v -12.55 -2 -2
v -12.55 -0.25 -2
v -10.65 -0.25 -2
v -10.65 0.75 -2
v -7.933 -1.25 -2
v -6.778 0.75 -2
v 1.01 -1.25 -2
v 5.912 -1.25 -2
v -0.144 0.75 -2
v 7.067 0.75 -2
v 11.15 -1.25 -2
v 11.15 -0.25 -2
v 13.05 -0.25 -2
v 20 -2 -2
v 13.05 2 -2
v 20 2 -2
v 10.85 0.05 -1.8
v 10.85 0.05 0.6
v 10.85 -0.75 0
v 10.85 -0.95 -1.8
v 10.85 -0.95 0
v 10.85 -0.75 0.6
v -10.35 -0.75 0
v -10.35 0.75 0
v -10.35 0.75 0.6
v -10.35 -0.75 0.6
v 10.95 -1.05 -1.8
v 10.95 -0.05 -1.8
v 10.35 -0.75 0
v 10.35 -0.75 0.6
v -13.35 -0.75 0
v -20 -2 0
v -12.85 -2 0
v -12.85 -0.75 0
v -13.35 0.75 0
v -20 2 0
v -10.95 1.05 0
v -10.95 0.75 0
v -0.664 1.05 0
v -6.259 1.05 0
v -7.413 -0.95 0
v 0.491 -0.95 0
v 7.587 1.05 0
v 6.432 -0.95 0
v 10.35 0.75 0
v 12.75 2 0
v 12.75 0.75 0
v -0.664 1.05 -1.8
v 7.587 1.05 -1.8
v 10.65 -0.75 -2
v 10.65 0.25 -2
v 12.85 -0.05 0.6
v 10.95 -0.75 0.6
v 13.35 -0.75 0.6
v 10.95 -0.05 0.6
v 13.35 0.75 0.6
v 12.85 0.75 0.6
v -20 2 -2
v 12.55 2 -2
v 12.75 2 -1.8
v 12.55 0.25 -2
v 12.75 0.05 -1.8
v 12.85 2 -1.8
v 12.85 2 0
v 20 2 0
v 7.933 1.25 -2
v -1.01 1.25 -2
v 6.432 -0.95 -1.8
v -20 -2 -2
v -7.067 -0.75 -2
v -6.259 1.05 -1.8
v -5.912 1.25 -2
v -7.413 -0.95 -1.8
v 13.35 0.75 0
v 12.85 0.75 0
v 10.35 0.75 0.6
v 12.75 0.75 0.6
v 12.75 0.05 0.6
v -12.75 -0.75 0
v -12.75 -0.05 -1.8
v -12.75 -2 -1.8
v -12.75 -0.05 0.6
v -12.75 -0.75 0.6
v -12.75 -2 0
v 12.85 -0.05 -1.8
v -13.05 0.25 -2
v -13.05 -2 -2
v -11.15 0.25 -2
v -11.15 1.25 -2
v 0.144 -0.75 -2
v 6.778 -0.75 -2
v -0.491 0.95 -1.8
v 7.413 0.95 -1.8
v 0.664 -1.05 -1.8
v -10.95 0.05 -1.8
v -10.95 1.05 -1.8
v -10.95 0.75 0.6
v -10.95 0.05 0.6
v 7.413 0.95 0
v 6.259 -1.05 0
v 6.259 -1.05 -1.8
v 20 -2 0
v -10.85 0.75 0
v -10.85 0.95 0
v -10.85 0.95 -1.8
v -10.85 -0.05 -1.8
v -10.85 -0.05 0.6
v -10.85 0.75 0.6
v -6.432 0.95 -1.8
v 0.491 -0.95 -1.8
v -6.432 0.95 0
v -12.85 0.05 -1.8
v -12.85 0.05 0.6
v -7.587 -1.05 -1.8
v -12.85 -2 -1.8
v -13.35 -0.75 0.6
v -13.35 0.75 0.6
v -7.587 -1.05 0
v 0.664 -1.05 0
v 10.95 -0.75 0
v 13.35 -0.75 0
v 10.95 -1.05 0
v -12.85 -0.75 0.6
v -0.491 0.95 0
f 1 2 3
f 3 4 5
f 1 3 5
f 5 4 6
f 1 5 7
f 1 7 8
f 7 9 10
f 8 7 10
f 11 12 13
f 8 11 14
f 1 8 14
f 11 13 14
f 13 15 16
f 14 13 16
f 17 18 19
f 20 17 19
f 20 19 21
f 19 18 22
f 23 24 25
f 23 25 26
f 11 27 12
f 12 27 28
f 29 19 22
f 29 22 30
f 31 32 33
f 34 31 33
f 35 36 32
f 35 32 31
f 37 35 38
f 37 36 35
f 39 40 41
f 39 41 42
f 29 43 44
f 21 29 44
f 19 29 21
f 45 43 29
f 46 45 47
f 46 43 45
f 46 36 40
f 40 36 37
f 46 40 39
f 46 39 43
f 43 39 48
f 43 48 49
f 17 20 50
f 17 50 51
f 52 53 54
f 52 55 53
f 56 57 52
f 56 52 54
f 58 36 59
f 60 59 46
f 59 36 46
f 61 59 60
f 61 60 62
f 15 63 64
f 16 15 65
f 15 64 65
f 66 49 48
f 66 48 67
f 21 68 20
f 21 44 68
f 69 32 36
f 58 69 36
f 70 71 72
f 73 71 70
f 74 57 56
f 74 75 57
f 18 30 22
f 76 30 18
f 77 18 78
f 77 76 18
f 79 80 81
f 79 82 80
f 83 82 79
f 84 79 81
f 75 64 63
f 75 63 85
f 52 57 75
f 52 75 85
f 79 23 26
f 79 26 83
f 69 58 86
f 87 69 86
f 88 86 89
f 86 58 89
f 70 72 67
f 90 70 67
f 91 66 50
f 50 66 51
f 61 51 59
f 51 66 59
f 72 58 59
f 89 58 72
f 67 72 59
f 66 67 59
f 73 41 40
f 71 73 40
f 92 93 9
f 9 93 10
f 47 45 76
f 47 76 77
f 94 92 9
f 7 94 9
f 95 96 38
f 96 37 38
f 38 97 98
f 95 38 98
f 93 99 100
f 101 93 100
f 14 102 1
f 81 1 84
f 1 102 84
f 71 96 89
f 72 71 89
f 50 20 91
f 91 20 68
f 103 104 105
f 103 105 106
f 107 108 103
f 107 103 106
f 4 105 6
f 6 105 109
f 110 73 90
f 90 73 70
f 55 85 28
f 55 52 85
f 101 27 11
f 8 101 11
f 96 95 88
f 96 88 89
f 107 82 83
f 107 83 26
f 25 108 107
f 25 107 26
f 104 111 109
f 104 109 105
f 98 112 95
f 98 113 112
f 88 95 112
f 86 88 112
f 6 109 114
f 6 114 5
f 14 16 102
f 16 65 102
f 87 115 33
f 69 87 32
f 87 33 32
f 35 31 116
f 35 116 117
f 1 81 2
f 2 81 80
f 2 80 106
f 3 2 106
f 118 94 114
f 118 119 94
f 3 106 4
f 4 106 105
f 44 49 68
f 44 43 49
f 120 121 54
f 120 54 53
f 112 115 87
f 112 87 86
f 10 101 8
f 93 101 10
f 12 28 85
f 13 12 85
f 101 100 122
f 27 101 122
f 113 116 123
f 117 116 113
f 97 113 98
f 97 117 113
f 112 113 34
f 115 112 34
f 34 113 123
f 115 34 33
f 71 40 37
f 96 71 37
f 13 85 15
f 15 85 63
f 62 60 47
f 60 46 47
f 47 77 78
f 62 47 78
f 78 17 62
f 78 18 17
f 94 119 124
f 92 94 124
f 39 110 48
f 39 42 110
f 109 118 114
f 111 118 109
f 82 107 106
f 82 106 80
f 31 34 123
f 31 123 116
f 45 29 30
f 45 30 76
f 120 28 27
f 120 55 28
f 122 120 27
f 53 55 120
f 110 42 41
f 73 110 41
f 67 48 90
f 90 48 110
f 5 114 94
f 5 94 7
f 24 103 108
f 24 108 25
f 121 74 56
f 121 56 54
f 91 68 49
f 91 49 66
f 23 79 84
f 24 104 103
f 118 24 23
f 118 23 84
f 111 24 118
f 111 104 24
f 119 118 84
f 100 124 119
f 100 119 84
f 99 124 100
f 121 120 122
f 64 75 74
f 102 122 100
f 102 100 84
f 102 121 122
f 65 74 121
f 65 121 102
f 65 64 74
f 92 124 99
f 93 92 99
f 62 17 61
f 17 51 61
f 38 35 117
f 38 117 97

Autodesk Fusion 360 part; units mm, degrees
sketch "Sketch1" plane through (0, 0, 0) normal (0, 0, 1) x (1, 0, 0)
  line L0 (20, -2) -> (-20, -2)
  line L1 (-20, -2) -> (-20, 2)
  line L2 (-20, 2) -> (20, 2)
  line L3 (20, 2) -> (20, -2)
  line L4 (20, -2) -> (-20, 2) construction
  line L5 (-20, -2) -> (20, 2) construction
  line L6 (0, 0) -> (0, -2) construction
  line L7 (0, 0) -> (0, 2) construction
  line L8 (-12.45, 2) -> (-12.45, -2) construction
  line L9 (-11.25, 2) -> (-11.25, -2) construction
  line L10 (-12.75, 2) -> (-12.75, -2)
  line L11 (-10.95, 2) -> (-10.95, -2)
  line L12 (-10.85, 2) -> (-10.85, -2)
  line L13 (-12.85, 2) -> (-12.85, -2)
  line L14 (-11.85, 2) -> (-11.85, -2) construction
  line L15 (-20, 0.05) -> (20, 0.05)
  line L16 (20, -0.05) -> (-20, -0.05)
  line L17 (-20, 0) -> (20, 0) construction
  line L18 (0.5774, -1) -> (-0.5774, 1) construction
  line L19 (0.5774, -1) -> (-7.5, -1) construction
  line L20 (-7.5, -1) -> (-6.3453, 1) construction
  line L21 (-6.3453, 1) -> (-10.95, 1) construction
  line L22 (-0.5774, 1) -> (7.5, 1) construction
  line L23 (7.5, 1) -> (6.3453, -1) construction
  line L24 (6.3453, -1) -> (10.95, -1) construction
  line L25 (-3.4613, -1) -> (-3.4613, 1.05) construction
  line L26 (3.4613, 1) -> (3.4613, -1.05) construction
  line L27 (-6.2587, 1.05) -> (-10.95, 1.05)
  line L28 (-7.4134, -0.95) -> (-6.2587, 1.05)
  line L29 (0.4907, -0.95) -> (-7.4134, -0.95)
  line L30 (0.4907, -0.95) -> (-0.664, 1.05)
  line L31 (-0.664, 1.05) -> (7.5866, 1.05)
  line L32 (7.5866, 1.05) -> (6.4319, -0.95)
  line L33 (6.4319, -0.95) -> (10.95, -0.95)
  line L34 (12.85, 2) -> (12.85, -2)
  line L35 (12.75, 2) -> (12.75, -2)
  line L36 (12.45, 2) -> (12.45, -2) construction
  line L37 (11.25, 2) -> (11.25, -2) construction
  line L38 (10.95, 2) -> (10.95, -2)
  line L39 (10.85, 2) -> (10.85, -2)
  line L40 (-6.4319, 0.95) -> (-10.95, 0.95)
  line L41 (-7.5866, -1.05) -> (-6.4319, 0.95)
  line L42 (0.664, -1.05) -> (-7.5866, -1.05)
  line L43 (0.664, -1.05) -> (-0.4907, 0.95)
  line L44 (-0.4907, 0.95) -> (7.4134, 0.95)
  line L45 (7.4134, 0.95) -> (6.2587, -1.05)
  line L46 (6.2587, -1.05) -> (10.95, -1.05)
  line L47 (11.85, 2) -> (11.85, -2) construction
  line L48 (-10.35, -0.75) -> (-13.35, -0.75)
  line L49 (-13.35, -0.75) -> (-13.35, 0.75)
  line L50 (-13.35, 0.75) -> (-10.35, 0.75)
  line L51 (-10.35, 0.75) -> (-10.35, -0.75)
  line L52 (-10.35, -0.75) -> (-13.35, 0.75) construction
  line L53 (-13.35, -0.75) -> (-10.35, 0.75) construction
  line L54 (13.35, -0.75) -> (10.35, -0.75)
  line L55 (10.35, -0.75) -> (10.35, 0.75)
  line L56 (10.35, 0.75) -> (13.35, 0.75)
  line L57 (13.35, 0.75) -> (13.35, -0.75)
  line L58 (13.35, -0.75) -> (10.35, 0.75) construction
  line L59 (10.35, -0.75) -> (13.35, 0.75) construction
  point P0 (-11.85, 0)
  point P1 (11.85, 0)
  dimension "d1" = 4
  dimension "d2" = 40
  dimension "d16" = 0.1
  dimension "d57" = 0.1
  dimension "d60" = 2
  dimension "d61" = 30
  dimension "d62" = 15
  dimension "d63" = 0.05
  dimension "d69" = 1.2
  dimension "d70" = 1.8
  dimension "d73" = 22.5
  dimension "d74" = -0.05
  dimension "d113" = 3
  dimension "d114" = 1.5
sketch "Sketch2" plane through (0, 0, 0) normal (0, 1, 0) x (1, 0, 0)
  line L0 (12.75, -0.3) -> (12.75, 0)
  line L1 (12.75, 0) -> (10.95, 0)
  line L2 (10.95, 0) -> (10.95, -0.3)
  line L3 (11.25, -2.4) -> (12.45, -2.4)
  line L4 (12.45, -2.4) -> (12.45, -1.8)
  line L5 (11.25, -1.8) -> (11.25, -2.4)
  line L6 (11.25, -1.8) -> (11.45, -1.8)
  line L7 (11.45, -1.8) -> (11.45, -0.3)
  line L8 (11.45, -0.3) -> (10.95, -0.3)
  line L9 (12.75, -0.3) -> (12.25, -0.3)
  line L10 (12.25, -0.3) -> (12.25, -1.8)
  line L11 (12.25, -1.8) -> (12.45, -1.8)
  line L12 (11.85, 0) -> (11.85, -2.4) construction
  line L13 (-12.45, -1.8) -> (-12.45, -2.4)
  line L14 (-11.85, 0) -> (-11.85, -2.4) construction
  line L15 (-10.95, 0) -> (-12.75, 0)
  line L16 (-12.45, -2.4) -> (-11.25, -2.4)
  line L17 (-11.45, -1.8) -> (-11.25, -1.8)
  line L18 (-12.75, 0) -> (-12.75, -0.3)
  line L19 (-11.25, -2.4) -> (-11.25, -1.8)
  line L20 (-10.95, -0.3) -> (-11.45, -0.3)
  line L21 (-11.45, -0.3) -> (-11.45, -1.8)
  line L22 (-12.25, -0.3) -> (-12.75, -0.3)
  line L23 (-10.95, -0.3) -> (-10.95, 0)
  line L24 (-12.45, -1.8) -> (-12.25, -1.8)
  line L25 (-12.25, -1.8) -> (-12.25, -0.3)
  point P0 (-11.85, 0)
  point P1 (11.85, 0)
  point P2 (12.45, 0)
  point P3 (12.75, 0)
  point P4 (-11.25, 0)
  point P5 (-10.95, 0)
  dimension "d77" = 0.3
  dimension "d85" = 1.2
  dimension "d87" = 0.6
  dimension "d88" = 0.8
  dimension "d94" = 2.4
extrude "Extrude2" add sketch "Sketch1" against normal blind 2 contours L15 L35 L38 L56 | L16 L39 L54 L55 | L16 L32 L33 L39 L54 L55 | L2 L35 L38 L56 | L15 L16 L39 L55 | L15 L38 L39 L56 | L2 L38 L39 L56 | L15 L16 L32 L55 | L15 L39 L55 L56 | L2 L12 L15 L27 L28 L30 L31 L32 L39 L55 L56 | L0 L1 L13 L16 L48 L49 | L2 L11 L12 L27 | L13 L16 L48 L49 | L10 L11 L15 L50 | L16 L28 L29 L30 | L15 L16 L28 L30 | L2 L10 L11 L50 | L1 L15 L16 L49 | L13 L15 L16 L49 | L10 L13 L15 L50 | L2 L10 L13 L50 | L1 L2 L13 L15 L49 L50 | L13 L15 L49 L50 makes body 1
extrude "Extrude3" add sketch "Sketch1" along normal blind 0.6 contours L15 L35 L38 L56 | L16 L39 L54 L55 | L15 L16 L39 L55 | L15 L38 L39 L56 | L15 L39 L55 L56 | L13 L16 L48 L49 | L10 L11 L15 L50 | L13 L15 L16 L49 | L10 L13 L15 L50 | L13 L15 L49 L50 bodies 1
extrude "Extrude1" add sketch "Sketch1" against normal up to surface (2 mm away) separate body contours L0 L3 L16 L34 L54 L57 | L0 L34 L35 L54 | L3 L15 L16 L57 | L0 L35 L38 L54 | L16 L34 L35 L54 | L16 L34 L54 L57 | L2 L3 L15 L34 L56 L57 | L15 L16 L34 L57 | L0 L38 L39 L46 | L16 L35 L38 L54 | L15 L34 L56 L57 | L0 L12 L16 L39 L41 L42 L43 L45 L46 L48 L51 | L0 L11 L12 L48 | L0 L10 L11 L48 | L11 L12 L16 L48 | L12 L16 L48 L51 | L10 L11 L16 L48 | L12 L15 L16 L51 | L15 L16 L43 L45 | L12 L15 L50 L51 | L15 L16 L41 L51 | L15 L43 L44 L45 | L12 L15 L40 L41 L50 L51 makes body 2 in component "Join 2"
extrude "Extrude2'" add sketch "Sketch1" along normal up to surface (0.6 mm away) contours L16 L34 L35 L54 | L16 L34 L54 L57 | L15 L16 L34 L57 | L16 L35 L38 L54 | L15 L34 L56 L57 | L11 L12 L16 L48 | L12 L16 L48 L51 | L10 L11 L16 L48 | L12 L15 L16 L51 | L12 L15 L50 L51 bodies 2 in component "Join 2"
chamfer "Chamfer2" distance 0.2 angle 45 13 edges at (-11.9, 0.05, -2) (-12.85, -0.975, -2) (-10.95, 0.55, -2) (-8.6043, 1.05, -2) (-6.836, 0.05, -2) (-3.4613, -0.95, -2) (-0.0866, 0.05, -2) (3.4613, 1.05, -2) (7.0093, 0.05, -2) (8.641, -0.95, -2) (10.85, -0.45, -2) (11.8, 0.05, -2) (12.75, 1.025, -2) on bodies 1
chamfer "Chamfer1" distance 0.2 angle 45 13 edges at (-8.641, 0.95, -2) (-10.85, 0.45, -2) (-11.8, -0.05, -2) (-12.75, -1.025, -2) (-7.0093, -0.05, -2) (-3.4613, -1.05, -2) (0.0866, -0.05, -2) (3.4613, 0.95, -2) (6.836, -0.05, -2) (8.6043, -1.05, -2) (10.95, -0.55, -2) (11.9, -0.05, -2) (12.85, 0.975, -2) on bodies 2 in component "Join 2"
component "Join 2" placed x (1, 0, 0) y (0, 1, 0) z (0, 0, 1) at (0, 0, 0)
equation "d1 = d62 / 3.75"
equation "d2 = d1 * 10"
equation "d57 = Tollerance"
equation "d60 = d1 / 2"
equation "d62 = d73 / 1.5"
equation "d69 = d73 / 18.75"
equation "d70 = d69 * 1.5"
equation "d73 = Gauge"
equation "d77 = d85 / 4"
equation "d87 = d85 / 2"
equation "d88 = d85 / 3 * 2"
equation "d94 = d85 * 2"
equation "Gauge = 22.5 mm"
equation "SleeperThickness = 2 mm"
equation "Tollerance = 0.1 mm"
equation "d105 = -SleeperThickness"
equation "SleeperSpcing = Gauge / 1.5"
equation "d113 = d69 * 2.5"
equation "d114 = d113 / 2"
equation "d115 = Gauge / 37.5"
